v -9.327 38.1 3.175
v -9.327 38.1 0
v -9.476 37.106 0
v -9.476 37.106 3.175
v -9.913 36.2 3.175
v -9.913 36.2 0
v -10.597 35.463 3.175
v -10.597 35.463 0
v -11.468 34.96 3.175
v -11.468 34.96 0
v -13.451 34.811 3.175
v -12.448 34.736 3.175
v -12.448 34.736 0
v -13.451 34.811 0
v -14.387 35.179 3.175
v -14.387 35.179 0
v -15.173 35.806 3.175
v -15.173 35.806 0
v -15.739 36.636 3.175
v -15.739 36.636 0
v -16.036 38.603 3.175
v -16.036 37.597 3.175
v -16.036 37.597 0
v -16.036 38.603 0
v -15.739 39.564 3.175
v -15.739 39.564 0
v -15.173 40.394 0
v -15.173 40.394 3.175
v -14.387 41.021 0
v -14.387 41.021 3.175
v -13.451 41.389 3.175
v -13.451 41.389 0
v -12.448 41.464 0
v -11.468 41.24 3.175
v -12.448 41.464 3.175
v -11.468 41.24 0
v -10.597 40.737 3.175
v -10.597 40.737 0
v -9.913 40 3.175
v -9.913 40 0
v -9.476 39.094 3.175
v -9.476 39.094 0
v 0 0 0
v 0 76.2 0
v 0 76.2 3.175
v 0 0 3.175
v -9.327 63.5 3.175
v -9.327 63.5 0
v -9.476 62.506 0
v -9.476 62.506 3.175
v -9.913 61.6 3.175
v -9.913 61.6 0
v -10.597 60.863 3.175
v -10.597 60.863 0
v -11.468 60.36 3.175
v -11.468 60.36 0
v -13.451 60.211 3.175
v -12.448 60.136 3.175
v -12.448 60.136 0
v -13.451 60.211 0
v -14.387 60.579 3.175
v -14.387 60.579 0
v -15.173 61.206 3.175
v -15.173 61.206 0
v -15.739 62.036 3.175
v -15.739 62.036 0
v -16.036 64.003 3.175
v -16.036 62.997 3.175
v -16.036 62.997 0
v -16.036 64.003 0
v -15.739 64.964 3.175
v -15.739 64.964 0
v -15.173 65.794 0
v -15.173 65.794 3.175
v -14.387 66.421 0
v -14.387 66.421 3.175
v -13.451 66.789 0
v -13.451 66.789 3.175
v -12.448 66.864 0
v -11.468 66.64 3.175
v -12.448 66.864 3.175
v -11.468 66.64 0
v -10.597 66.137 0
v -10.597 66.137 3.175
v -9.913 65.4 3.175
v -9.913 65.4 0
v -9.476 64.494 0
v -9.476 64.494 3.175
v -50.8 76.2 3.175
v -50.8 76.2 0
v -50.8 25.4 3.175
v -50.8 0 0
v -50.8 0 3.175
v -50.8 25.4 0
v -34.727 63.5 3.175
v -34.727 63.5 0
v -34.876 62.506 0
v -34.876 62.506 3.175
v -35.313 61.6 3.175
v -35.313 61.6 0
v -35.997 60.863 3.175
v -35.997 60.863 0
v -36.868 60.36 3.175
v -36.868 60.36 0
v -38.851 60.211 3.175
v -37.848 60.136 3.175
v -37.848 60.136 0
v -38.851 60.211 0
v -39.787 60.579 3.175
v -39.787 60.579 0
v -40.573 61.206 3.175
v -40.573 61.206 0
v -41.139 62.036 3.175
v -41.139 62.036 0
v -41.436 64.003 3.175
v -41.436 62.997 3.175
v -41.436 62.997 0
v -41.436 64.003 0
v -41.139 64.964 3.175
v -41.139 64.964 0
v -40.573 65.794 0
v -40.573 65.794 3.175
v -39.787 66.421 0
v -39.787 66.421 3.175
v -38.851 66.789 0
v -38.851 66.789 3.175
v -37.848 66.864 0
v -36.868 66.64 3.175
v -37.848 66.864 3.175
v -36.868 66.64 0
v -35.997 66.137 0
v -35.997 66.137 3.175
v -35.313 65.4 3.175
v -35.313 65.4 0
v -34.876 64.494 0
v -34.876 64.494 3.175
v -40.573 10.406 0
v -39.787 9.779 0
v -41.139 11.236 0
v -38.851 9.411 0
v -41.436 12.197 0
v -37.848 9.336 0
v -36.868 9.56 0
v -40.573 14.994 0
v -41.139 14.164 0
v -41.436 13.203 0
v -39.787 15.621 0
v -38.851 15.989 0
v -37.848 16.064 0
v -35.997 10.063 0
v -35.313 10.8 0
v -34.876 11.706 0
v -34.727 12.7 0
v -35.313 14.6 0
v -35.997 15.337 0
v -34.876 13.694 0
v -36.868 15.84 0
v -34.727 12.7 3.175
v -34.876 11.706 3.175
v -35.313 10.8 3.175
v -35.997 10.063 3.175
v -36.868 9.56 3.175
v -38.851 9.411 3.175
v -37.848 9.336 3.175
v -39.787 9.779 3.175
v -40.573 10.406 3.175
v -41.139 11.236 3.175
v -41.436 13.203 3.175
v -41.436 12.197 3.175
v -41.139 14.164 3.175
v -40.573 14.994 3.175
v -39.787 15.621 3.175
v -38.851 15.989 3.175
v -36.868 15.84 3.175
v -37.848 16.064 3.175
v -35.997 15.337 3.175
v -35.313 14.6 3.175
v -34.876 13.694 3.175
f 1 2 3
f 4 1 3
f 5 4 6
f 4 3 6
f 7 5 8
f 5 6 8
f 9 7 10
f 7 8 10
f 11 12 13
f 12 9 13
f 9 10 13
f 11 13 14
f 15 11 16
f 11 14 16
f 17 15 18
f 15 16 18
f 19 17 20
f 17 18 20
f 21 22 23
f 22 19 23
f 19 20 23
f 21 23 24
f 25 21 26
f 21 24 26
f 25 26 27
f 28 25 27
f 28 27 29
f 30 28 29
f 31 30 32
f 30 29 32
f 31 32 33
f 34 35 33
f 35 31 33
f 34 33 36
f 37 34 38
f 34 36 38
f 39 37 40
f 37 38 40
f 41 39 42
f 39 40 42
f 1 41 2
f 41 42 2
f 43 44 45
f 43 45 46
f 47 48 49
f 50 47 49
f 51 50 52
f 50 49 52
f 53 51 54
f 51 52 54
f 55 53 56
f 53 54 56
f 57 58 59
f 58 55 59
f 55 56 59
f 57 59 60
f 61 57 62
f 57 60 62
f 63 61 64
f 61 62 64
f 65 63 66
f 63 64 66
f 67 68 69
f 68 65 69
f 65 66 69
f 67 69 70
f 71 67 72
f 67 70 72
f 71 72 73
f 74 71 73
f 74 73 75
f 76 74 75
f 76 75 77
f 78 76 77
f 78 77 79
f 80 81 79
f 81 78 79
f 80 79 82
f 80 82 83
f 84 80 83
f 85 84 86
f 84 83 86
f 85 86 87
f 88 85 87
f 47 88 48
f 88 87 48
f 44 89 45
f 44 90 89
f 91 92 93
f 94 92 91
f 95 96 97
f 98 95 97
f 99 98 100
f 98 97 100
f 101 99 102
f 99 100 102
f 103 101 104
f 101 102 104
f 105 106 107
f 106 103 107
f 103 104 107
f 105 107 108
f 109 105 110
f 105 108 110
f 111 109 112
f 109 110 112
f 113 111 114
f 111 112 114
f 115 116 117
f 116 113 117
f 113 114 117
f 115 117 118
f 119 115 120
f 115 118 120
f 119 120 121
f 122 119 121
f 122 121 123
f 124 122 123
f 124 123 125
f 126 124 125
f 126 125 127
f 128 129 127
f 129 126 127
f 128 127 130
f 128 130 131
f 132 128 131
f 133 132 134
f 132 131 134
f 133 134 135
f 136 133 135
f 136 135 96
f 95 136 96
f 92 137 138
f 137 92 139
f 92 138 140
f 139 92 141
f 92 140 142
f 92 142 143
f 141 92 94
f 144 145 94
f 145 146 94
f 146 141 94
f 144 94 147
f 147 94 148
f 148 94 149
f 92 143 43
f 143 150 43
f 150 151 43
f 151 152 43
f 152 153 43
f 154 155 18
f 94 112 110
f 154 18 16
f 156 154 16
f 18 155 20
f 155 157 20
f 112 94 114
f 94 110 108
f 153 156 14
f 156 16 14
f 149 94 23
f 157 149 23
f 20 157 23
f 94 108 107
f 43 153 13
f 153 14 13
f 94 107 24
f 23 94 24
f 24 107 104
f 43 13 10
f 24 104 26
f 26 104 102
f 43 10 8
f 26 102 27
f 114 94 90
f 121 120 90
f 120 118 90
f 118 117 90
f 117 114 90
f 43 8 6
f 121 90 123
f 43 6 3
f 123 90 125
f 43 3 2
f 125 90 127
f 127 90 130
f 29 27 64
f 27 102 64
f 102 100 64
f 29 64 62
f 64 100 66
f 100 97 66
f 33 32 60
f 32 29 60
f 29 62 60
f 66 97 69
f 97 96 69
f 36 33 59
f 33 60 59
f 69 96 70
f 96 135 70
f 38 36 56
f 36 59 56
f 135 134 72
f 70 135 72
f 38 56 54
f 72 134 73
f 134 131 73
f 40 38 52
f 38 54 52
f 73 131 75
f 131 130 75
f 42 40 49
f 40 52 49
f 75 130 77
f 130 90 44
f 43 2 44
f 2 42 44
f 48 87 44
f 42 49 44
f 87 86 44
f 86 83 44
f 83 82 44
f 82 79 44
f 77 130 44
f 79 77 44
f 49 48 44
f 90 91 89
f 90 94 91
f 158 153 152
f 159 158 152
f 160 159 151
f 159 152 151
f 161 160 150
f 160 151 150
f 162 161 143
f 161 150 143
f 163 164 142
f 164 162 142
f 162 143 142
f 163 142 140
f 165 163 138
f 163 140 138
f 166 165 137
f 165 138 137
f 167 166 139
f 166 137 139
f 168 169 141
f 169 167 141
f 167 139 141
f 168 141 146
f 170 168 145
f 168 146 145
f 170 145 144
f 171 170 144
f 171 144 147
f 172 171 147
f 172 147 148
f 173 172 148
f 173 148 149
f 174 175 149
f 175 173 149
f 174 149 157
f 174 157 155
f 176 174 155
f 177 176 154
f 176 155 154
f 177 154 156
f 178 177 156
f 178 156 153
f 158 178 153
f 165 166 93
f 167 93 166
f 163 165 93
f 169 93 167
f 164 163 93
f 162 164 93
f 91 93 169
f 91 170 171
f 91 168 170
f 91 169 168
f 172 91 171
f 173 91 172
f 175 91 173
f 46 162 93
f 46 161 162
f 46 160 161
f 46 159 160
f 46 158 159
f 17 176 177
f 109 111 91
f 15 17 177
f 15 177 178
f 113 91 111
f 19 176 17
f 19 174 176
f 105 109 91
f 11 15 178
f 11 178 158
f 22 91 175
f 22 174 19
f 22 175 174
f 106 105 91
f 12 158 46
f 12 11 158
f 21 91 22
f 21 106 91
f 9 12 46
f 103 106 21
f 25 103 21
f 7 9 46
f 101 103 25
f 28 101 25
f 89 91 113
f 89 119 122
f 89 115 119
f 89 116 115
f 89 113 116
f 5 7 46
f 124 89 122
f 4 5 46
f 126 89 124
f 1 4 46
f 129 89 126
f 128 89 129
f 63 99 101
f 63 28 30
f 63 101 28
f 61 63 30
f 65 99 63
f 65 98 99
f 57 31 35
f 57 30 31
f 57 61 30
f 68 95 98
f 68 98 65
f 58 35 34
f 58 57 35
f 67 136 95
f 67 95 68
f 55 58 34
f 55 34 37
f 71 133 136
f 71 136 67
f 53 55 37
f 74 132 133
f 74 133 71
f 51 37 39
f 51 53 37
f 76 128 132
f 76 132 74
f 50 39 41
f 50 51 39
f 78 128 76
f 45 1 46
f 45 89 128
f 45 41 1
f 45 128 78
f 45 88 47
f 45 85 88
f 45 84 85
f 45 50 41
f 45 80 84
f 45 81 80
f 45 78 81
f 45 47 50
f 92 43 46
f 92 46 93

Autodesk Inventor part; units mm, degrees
ref_plane "YZ Plane" through (0, 0, 0) normal (1, 0, 0) x (0, 1, 0)
ref_plane "XZ Plane" through (0, 0, 0) normal (0, 1, 0) x (-1, 0, 0)
ref_plane "XY Plane" through (0, 0, 0) normal (0, 0, 1) x (1, 0, 0)
sketch "Sketch1" plane through (0, 0, 0) normal (0, 0, 1) x (1, 0, 0)
  line L0 (0, 0) -> (-50.8, 0)
  line L1 (-50.8, 0) -> (-50.8, 25.4)
  line L2 (-50.8, 25.4) -> (-50.8, 76.2)
  line L3 (-50.8, 76.2) -> (0, 76.2)
  line L4 (0, 76.2) -> (0, 0)
  circle A0 centre (-38.1, 12.7) radius 3.3734
  circle A1 centre (-12.7, 38.1) radius 3.3734
  circle A2 centre (-12.7, 63.5) radius 3.3734
  circle A3 centre (-38.1, 63.5) radius 3.3734
  dimension "d0" = 50.8
  dimension "d1" = 25.4
  dimension "d2" = 76.2
  dimension "d3" = 50.8
  dimension "d4" = 6.7469
  dimension "d5" = 38.1
  dimension "d6" = 12.7
  dimension "d7" = 38.1
  dimension "d9" = 12.7
  dimension "d10" = 12.7
  dimension "d14" = 12.7
  dimension "d15" = 12.7
  dimension "d18" = 12.7
extrude "Extrusion2" add sketch "Sketch1" along normal blind 3.175
properties part number "fly wheel gusset" material "Aluminum 6061"
